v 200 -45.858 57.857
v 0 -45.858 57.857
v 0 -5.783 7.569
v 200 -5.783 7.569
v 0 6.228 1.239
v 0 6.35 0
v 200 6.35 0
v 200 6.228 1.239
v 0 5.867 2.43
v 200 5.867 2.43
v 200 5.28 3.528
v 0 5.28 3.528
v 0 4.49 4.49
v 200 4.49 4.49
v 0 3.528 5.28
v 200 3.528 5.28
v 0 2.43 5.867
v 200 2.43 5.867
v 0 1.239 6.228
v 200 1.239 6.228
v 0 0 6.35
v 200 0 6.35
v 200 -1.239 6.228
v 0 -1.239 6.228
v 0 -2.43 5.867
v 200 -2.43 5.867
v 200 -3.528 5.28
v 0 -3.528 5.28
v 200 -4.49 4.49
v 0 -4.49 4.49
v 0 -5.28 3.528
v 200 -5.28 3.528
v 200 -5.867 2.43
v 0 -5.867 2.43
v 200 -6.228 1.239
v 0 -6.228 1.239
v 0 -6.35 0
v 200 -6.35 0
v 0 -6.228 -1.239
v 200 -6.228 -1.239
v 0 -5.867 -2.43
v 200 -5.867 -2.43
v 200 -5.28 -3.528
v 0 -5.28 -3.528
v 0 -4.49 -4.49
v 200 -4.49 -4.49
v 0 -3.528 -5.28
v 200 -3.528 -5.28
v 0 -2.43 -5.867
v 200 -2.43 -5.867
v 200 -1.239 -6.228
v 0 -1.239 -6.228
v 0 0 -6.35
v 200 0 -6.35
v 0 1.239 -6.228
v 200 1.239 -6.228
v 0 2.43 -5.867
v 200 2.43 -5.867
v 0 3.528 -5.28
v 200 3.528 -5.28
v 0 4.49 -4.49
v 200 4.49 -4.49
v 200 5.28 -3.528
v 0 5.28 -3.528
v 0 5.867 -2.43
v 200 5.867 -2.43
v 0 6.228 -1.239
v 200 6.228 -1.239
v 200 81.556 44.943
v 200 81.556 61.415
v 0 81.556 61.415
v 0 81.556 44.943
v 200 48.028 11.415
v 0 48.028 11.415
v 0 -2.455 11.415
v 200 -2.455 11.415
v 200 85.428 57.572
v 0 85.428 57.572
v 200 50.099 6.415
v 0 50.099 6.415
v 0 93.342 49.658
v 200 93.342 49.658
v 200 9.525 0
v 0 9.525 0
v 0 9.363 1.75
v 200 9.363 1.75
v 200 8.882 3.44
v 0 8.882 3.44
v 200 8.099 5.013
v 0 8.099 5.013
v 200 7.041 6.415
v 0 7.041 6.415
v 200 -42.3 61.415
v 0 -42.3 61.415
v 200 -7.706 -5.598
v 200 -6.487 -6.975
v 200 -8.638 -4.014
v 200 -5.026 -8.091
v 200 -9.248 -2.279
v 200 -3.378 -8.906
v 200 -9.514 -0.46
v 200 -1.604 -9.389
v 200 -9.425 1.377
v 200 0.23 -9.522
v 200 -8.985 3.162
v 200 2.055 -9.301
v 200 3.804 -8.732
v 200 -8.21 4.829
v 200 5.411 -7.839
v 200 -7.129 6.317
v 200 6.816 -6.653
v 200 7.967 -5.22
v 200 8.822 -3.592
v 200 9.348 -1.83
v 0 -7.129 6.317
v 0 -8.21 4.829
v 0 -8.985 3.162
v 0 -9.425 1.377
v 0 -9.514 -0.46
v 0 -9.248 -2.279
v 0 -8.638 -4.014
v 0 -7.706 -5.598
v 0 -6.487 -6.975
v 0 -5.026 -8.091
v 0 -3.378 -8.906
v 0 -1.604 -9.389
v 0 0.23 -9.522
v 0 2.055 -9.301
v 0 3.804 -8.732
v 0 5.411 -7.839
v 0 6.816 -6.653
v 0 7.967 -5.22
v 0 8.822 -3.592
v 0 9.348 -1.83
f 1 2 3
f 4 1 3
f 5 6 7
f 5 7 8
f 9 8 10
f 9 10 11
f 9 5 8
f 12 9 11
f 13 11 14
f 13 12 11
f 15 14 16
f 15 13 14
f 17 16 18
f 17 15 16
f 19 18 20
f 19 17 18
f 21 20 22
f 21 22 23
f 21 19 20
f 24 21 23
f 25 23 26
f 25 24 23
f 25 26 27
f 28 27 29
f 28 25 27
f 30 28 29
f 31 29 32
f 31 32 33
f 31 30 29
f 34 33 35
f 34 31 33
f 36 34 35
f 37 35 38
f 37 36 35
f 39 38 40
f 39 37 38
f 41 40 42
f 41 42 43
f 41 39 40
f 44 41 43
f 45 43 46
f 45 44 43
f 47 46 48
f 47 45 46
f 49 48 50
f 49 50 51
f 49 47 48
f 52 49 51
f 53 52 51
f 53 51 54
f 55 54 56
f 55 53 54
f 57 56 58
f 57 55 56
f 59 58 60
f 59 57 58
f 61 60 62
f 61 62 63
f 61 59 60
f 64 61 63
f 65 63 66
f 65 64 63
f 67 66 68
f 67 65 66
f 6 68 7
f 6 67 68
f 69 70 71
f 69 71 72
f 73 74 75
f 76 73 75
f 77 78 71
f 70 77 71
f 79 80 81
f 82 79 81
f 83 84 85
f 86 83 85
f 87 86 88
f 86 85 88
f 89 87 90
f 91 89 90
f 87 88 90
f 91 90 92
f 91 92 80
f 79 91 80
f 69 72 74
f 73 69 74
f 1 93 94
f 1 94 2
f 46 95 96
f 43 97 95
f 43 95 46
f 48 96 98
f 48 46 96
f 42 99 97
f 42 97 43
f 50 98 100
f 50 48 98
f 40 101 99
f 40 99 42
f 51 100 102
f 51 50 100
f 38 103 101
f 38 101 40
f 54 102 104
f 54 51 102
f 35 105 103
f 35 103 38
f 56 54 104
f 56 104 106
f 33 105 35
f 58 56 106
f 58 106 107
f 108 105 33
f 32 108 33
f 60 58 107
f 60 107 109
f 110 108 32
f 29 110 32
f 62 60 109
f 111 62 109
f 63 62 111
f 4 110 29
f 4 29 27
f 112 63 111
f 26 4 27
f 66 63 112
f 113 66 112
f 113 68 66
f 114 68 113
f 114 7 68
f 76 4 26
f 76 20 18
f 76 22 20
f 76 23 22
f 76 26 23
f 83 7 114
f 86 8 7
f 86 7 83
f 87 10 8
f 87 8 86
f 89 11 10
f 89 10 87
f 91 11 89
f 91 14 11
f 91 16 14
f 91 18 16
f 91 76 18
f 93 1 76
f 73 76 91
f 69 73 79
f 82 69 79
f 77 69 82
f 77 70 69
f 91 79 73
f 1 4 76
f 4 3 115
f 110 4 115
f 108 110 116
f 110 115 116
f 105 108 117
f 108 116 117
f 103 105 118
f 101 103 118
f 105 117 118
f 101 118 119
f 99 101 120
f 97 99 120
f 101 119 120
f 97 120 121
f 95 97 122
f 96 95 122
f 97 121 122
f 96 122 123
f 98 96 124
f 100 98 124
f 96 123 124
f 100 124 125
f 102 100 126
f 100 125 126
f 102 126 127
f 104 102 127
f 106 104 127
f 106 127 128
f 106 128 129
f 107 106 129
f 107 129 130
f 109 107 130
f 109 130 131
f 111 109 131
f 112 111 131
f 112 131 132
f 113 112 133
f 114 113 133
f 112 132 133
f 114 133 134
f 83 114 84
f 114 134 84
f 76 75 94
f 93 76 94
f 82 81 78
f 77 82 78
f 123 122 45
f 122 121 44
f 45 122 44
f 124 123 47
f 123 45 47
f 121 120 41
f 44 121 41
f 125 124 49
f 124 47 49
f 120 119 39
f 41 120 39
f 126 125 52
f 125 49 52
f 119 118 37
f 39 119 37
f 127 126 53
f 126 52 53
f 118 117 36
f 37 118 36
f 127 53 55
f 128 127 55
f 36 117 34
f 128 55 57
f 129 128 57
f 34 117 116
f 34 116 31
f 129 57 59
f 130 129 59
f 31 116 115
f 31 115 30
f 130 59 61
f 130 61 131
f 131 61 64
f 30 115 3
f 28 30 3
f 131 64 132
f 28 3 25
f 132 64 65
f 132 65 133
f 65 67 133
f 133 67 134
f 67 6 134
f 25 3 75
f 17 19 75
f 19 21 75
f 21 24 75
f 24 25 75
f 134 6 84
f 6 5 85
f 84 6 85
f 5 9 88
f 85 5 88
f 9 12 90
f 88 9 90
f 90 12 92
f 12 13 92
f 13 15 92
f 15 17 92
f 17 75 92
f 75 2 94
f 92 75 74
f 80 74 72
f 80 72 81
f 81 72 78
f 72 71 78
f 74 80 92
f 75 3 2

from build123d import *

# Parameters (mm, degrees)
F0_R     = 6.35
F1_DEPTH = 200


with BuildPart() as f1:
    # F0 (on Right) → F1 (new body)
    with BuildSketch(Plane.YZ):
        with BuildLine():
            ThreePointArc((-5.7829078209, 7.568593141), (-4.2215771937, -8.5383787101), (9.525, 0))
            ThreePointArc((9.525, 0), (8.8822194716, 3.4397386904), (7.0406320718, 6.4152260311))
            Line((7.0406320718, 6.4152260311), (-4.86379717, 6.4152260311))
            Line((-4.86379717, 6.4152260311), (-5.7829078209, 7.568593141))
        make_face()
        Circle(F0_R, mode=Mode.SUBTRACT)
        with BuildLine():
            Line((-4.86379717, 6.4152260311), (7.0406320718, 6.4152260311))
            ThreePointArc((7.0406320718, 6.4152260311), (0.8532476167, 9.4867061462), (-5.7829078209, 7.568593141))
            Line((-5.7829078209, 7.568593141), (-4.86379717, 6.4152260311))
        make_face()
        with BuildLine():
            ThreePointArc((-5.7829078209, 7.568593141), (0.8532476167, 9.4867061462), (7.0406320718, 6.4152260311))
            Line((7.0406320718, 6.4152260311), (50.0992612617, 6.4152260311))
            Line((50.0992612617, 6.4152260311), (93.3420076617, 49.6579724311))
            Line((93.3420076617, 49.6579724311), (85.4284786876, 57.5715014053))
            Line((85.4284786876, 57.5715014053), (81.5560158427, 61.4152260311))
            Line((81.5560158427, 61.4152260311), (81.5560158427, 44.943048424))
            Line((81.5560158427, 44.943048424), (48.0281934499, 11.4152260311))
            Line((48.0281934499, 11.4152260311), (-2.454831837, 11.4152260311))
            Line((-2.454831837, 11.4152260311), (-42.2995024128, 61.4152260311))
            Line((-42.2995024128, 61.4152260311), (-45.8575500686, 57.8571783753))
            Line((-45.8575500686, 57.8571783753), (-5.7829078209, 7.568593141))
        make_face()
    extrude(amount=F1_DEPTH)


solid = f1.part
